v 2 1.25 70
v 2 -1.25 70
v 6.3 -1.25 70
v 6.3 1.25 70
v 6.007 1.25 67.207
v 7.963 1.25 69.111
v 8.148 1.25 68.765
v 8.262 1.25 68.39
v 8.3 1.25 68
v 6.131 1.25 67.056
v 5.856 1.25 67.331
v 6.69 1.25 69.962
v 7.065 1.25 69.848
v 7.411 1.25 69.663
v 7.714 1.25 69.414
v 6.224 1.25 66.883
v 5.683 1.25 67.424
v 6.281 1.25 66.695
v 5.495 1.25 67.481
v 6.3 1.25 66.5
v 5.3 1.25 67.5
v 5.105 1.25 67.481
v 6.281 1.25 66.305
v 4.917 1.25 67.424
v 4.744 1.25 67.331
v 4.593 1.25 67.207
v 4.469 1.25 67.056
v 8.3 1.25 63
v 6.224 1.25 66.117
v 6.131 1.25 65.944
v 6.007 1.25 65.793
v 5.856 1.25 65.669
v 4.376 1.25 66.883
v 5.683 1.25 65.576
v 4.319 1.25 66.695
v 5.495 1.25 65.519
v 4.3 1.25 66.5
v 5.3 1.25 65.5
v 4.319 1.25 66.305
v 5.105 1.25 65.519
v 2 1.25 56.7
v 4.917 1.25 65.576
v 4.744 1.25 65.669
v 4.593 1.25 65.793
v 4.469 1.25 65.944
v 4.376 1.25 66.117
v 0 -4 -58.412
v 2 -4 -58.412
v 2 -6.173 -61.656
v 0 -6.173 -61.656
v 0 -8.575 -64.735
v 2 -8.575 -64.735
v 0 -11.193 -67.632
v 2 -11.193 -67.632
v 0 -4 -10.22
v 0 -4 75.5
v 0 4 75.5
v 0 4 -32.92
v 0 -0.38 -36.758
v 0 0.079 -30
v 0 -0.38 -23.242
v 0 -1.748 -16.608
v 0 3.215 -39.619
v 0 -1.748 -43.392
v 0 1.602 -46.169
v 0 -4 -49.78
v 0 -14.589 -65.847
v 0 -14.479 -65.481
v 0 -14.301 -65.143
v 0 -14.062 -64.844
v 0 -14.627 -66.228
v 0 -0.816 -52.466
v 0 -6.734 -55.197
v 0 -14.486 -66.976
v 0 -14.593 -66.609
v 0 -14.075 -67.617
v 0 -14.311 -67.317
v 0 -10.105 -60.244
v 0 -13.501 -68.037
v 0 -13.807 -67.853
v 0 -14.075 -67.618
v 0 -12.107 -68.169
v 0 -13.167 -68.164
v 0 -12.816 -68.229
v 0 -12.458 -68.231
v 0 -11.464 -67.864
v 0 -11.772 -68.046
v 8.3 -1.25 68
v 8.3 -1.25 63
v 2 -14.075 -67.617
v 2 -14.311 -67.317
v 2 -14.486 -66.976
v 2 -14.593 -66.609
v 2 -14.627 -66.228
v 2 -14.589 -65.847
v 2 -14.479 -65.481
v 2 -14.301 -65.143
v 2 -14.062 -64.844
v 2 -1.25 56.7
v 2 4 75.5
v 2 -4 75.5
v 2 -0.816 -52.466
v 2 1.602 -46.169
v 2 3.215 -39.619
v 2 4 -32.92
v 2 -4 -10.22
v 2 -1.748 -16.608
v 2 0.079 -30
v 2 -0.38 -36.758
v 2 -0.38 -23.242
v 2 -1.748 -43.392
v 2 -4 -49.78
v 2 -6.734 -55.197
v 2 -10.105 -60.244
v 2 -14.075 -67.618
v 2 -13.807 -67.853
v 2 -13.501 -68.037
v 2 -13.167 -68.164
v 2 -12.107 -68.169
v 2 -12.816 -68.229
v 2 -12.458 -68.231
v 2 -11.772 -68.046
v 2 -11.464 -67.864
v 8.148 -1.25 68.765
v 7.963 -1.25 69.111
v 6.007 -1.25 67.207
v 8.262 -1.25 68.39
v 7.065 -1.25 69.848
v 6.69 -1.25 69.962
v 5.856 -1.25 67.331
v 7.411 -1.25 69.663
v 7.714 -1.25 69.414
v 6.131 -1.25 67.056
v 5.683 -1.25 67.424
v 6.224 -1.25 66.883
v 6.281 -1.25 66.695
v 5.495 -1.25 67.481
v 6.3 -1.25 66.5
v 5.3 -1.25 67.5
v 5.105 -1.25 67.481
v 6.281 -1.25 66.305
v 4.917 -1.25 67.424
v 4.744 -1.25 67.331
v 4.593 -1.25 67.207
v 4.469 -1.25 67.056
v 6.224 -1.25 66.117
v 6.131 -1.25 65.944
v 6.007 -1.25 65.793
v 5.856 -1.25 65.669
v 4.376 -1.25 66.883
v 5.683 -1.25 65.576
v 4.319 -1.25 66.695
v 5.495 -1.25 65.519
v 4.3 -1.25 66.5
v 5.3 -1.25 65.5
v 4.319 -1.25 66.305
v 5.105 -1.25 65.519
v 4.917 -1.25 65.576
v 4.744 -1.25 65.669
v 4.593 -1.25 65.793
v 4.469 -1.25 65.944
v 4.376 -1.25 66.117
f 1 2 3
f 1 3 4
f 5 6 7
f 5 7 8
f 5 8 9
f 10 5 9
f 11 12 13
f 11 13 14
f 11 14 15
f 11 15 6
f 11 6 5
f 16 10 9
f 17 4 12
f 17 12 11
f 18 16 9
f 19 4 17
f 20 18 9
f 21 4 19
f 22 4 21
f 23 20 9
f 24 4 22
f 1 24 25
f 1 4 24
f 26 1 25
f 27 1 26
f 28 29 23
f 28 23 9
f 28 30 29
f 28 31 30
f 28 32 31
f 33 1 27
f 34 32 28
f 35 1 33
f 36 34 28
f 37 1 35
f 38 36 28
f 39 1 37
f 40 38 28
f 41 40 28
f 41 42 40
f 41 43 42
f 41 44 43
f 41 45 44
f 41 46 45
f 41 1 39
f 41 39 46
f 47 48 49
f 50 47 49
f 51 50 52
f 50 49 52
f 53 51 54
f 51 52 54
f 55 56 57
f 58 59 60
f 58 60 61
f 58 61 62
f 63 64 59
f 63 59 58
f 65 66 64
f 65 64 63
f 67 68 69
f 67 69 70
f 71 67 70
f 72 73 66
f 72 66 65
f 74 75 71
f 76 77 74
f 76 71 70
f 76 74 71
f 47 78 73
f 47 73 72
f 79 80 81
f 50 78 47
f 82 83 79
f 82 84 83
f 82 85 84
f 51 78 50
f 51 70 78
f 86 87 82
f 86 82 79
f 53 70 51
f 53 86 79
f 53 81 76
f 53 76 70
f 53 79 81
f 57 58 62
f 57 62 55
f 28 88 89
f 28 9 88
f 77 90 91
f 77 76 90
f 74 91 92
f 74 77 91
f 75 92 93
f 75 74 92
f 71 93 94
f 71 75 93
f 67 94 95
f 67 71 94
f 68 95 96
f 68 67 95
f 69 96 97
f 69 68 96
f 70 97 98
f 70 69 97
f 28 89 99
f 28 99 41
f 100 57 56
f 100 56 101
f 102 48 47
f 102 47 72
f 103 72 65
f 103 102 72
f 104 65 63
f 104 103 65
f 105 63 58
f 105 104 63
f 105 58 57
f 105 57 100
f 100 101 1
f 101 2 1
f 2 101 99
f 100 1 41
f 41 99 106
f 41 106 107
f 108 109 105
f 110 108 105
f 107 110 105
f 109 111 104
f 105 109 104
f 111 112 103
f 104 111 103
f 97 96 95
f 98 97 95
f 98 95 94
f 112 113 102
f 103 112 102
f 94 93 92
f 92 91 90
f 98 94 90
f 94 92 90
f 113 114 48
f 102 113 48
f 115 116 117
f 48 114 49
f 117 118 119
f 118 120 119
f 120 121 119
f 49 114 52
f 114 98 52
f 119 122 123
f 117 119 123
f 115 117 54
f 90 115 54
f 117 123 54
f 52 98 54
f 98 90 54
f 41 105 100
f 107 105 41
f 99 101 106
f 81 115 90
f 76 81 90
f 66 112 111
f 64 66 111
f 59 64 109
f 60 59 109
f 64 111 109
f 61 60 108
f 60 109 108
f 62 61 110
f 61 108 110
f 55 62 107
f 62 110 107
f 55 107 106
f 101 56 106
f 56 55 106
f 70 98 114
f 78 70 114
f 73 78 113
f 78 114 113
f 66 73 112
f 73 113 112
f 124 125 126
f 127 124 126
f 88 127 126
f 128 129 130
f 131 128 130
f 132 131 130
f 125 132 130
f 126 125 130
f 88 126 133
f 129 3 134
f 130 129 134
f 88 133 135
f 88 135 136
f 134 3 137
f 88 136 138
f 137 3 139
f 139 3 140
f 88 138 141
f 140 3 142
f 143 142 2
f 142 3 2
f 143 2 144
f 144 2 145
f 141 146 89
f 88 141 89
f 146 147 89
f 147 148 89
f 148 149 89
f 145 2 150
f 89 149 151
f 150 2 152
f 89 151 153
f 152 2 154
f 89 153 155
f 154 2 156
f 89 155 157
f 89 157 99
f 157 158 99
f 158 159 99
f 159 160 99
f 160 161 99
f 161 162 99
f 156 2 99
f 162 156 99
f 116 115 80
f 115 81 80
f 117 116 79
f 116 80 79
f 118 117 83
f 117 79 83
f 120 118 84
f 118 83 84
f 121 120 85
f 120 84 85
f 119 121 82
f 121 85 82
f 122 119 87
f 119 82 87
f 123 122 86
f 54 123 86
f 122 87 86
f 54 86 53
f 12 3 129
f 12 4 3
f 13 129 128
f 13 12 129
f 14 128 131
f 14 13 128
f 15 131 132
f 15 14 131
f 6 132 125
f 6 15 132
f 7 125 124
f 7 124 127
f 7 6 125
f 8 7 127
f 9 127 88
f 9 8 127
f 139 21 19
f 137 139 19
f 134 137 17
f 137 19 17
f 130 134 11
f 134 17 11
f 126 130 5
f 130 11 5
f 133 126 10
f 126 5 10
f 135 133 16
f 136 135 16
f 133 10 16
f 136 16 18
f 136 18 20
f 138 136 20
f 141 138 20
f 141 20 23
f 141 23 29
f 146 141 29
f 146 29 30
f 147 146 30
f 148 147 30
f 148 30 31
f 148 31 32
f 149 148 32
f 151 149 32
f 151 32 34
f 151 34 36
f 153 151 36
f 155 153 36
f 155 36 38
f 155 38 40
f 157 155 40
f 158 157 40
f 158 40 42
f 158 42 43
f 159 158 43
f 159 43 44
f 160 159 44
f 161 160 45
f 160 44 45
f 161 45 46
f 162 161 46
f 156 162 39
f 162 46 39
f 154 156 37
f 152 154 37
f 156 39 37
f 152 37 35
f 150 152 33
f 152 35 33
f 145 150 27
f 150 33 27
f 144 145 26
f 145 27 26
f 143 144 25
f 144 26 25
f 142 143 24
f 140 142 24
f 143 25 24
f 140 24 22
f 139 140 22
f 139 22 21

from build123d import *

# Parameters (mm, degrees)
SKETCH1_W           = 140
SKETCH1_H           = 8
BOSS_EXTRUDE1_DEPTH = 2
SKETCH3_W           = 7
SKETCH3_H           = 2.5
BOSS_EXTRUDE2_DEPTH = 6.3
SKETCH4_R           = 1
CUT_EXTRUDE1_DEPTH  = 4
SKETCH6_R           = 50
CUT_EXTRUDE3_DEPTH  = 14
BOSS_EXTRUDE4_DEPTH = 2
CUT_EXTRUDE5_DEPTH  = 2
FILLET6_R           = 2
FILLET7_R           = 2
SKETCH11_W          = 2
SKETCH11_H          = 8
BOSS_EXTRUDE5_DEPTH = 5.5
CHAMFER1_SIZE       = 6.3


with BuildPart() as part:
    # Sketch1 → Boss-Extrude1 (new body)
    with BuildSketch(Plane(origin=(0, 0, 0), x_dir=(0, 0, -1), z_dir=(1, 0, 0))):
        Rectangle(SKETCH1_W, SKETCH1_H)
    extrude(amount=BOSS_EXTRUDE1_DEPTH)

    # Sketch3 → Boss-Extrude2 (add)
    with BuildSketch(Plane(origin=(2, 0, 0), x_dir=(0, 0, -1), z_dir=(1, 0, 0))):
        with Locations((-66.5, 0)):
            Rectangle(SKETCH3_W, SKETCH3_H)
    extrude(amount=BOSS_EXTRUDE2_DEPTH)

    # Sketch4 → Cut-Extrude1 (cut)
    with BuildSketch(Plane(origin=(0, 1.25, 0), x_dir=(1, 0, 0), z_dir=(0, 1, 0))):
        with Locations(Location((5.3, -66.5, 0), (0, 0, 270))):
            Circle(SKETCH4_R)
    extrude(amount=-CUT_EXTRUDE1_DEPTH, mode=Mode.SUBTRACT)

    # Sketch6 → Cut-Extrude3 (cut)
    with BuildSketch(Plane(origin=(2, 0, 0), x_dir=(0, 0, -1), z_dir=(1, 0, 0))):
        with Locations((30, -49.921005204)):
            Circle(SKETCH6_R)
    extrude(amount=-CUT_EXTRUDE3_DEPTH, mode=Mode.SUBTRACT)

    # Sketch9 → Boss-Extrude4 (add)
    with BuildSketch(Plane(origin=(2, 0, 0), x_dir=(0, 0, -1), z_dir=(1, 0, 0))):
        with BuildLine():
            Line((69.093233498, -12.668903321), (66.197438424, -15.428318275))
            ThreePointArc((66.197438424, -15.428318275), (58.566223606, -8.884791089), (49.780325606, -4))
            Line((49.780325606, -4), (58.412343815, -4))
            ThreePointArc((58.412343815, -4), (64.029960524, -7.992950315), (69.093233498, -12.668903321))
        make_face()
    extrude(amount=-BOSS_EXTRUDE4_DEPTH)

    # Sketch10 → Cut-Extrude5 (cut)
    with BuildSketch(Plane(origin=(2, 0, 0), x_dir=(0, 0, -1), z_dir=(1, 0, 0))):
        with BuildLine():
            Line((30, 4.078994796), (98.693138082, 13.357457715))
            Line((98.693138082, 13.357457715), (83.74319787, -55.181108121))
            ThreePointArc((83.74319787, -55.181108121), (70.000284733, -13.644604869), (30, 4.078994796))
        make_face()
    extrude(amount=-CUT_EXTRUDE5_DEPTH, mode=Mode.SUBTRACT)

    # Fillet6
    fillet6_edges = [part.edges().sort_by_distance(p)[0] for p in [
        (1, -15.428318275, -66.197438424),
        (1, -12.668903321, -69.093233498),
    ]]
    fillet(fillet6_edges, radius=FILLET6_R - 0.0001)  # a hair under: the kernel refuses the full size

    # Fillet7
    fillet7_edges = [part.edges().sort_by_distance(p)[0] for p in [
        (8.3, 0, 70),
    ]]
    fillet(fillet7_edges, radius=FILLET7_R)

    # Sketch11 → Boss-Extrude5 (add)
    with BuildSketch(Plane.XY.offset(70)):
        with Locations((1, 0)):
            Rectangle(SKETCH11_W, SKETCH11_H)
    extrude(amount=BOSS_EXTRUDE5_DEPTH)

    # Chamfer1
    chamfer1_edges = [part.edges().sort_by_distance(p)[0] for p in [
        (2, 0, 63),
    ]]
    chamfer(chamfer1_edges, length=CHAMFER1_SIZE - 0.0001)  # a hair under: the kernel refuses the full size


solid = part.part
